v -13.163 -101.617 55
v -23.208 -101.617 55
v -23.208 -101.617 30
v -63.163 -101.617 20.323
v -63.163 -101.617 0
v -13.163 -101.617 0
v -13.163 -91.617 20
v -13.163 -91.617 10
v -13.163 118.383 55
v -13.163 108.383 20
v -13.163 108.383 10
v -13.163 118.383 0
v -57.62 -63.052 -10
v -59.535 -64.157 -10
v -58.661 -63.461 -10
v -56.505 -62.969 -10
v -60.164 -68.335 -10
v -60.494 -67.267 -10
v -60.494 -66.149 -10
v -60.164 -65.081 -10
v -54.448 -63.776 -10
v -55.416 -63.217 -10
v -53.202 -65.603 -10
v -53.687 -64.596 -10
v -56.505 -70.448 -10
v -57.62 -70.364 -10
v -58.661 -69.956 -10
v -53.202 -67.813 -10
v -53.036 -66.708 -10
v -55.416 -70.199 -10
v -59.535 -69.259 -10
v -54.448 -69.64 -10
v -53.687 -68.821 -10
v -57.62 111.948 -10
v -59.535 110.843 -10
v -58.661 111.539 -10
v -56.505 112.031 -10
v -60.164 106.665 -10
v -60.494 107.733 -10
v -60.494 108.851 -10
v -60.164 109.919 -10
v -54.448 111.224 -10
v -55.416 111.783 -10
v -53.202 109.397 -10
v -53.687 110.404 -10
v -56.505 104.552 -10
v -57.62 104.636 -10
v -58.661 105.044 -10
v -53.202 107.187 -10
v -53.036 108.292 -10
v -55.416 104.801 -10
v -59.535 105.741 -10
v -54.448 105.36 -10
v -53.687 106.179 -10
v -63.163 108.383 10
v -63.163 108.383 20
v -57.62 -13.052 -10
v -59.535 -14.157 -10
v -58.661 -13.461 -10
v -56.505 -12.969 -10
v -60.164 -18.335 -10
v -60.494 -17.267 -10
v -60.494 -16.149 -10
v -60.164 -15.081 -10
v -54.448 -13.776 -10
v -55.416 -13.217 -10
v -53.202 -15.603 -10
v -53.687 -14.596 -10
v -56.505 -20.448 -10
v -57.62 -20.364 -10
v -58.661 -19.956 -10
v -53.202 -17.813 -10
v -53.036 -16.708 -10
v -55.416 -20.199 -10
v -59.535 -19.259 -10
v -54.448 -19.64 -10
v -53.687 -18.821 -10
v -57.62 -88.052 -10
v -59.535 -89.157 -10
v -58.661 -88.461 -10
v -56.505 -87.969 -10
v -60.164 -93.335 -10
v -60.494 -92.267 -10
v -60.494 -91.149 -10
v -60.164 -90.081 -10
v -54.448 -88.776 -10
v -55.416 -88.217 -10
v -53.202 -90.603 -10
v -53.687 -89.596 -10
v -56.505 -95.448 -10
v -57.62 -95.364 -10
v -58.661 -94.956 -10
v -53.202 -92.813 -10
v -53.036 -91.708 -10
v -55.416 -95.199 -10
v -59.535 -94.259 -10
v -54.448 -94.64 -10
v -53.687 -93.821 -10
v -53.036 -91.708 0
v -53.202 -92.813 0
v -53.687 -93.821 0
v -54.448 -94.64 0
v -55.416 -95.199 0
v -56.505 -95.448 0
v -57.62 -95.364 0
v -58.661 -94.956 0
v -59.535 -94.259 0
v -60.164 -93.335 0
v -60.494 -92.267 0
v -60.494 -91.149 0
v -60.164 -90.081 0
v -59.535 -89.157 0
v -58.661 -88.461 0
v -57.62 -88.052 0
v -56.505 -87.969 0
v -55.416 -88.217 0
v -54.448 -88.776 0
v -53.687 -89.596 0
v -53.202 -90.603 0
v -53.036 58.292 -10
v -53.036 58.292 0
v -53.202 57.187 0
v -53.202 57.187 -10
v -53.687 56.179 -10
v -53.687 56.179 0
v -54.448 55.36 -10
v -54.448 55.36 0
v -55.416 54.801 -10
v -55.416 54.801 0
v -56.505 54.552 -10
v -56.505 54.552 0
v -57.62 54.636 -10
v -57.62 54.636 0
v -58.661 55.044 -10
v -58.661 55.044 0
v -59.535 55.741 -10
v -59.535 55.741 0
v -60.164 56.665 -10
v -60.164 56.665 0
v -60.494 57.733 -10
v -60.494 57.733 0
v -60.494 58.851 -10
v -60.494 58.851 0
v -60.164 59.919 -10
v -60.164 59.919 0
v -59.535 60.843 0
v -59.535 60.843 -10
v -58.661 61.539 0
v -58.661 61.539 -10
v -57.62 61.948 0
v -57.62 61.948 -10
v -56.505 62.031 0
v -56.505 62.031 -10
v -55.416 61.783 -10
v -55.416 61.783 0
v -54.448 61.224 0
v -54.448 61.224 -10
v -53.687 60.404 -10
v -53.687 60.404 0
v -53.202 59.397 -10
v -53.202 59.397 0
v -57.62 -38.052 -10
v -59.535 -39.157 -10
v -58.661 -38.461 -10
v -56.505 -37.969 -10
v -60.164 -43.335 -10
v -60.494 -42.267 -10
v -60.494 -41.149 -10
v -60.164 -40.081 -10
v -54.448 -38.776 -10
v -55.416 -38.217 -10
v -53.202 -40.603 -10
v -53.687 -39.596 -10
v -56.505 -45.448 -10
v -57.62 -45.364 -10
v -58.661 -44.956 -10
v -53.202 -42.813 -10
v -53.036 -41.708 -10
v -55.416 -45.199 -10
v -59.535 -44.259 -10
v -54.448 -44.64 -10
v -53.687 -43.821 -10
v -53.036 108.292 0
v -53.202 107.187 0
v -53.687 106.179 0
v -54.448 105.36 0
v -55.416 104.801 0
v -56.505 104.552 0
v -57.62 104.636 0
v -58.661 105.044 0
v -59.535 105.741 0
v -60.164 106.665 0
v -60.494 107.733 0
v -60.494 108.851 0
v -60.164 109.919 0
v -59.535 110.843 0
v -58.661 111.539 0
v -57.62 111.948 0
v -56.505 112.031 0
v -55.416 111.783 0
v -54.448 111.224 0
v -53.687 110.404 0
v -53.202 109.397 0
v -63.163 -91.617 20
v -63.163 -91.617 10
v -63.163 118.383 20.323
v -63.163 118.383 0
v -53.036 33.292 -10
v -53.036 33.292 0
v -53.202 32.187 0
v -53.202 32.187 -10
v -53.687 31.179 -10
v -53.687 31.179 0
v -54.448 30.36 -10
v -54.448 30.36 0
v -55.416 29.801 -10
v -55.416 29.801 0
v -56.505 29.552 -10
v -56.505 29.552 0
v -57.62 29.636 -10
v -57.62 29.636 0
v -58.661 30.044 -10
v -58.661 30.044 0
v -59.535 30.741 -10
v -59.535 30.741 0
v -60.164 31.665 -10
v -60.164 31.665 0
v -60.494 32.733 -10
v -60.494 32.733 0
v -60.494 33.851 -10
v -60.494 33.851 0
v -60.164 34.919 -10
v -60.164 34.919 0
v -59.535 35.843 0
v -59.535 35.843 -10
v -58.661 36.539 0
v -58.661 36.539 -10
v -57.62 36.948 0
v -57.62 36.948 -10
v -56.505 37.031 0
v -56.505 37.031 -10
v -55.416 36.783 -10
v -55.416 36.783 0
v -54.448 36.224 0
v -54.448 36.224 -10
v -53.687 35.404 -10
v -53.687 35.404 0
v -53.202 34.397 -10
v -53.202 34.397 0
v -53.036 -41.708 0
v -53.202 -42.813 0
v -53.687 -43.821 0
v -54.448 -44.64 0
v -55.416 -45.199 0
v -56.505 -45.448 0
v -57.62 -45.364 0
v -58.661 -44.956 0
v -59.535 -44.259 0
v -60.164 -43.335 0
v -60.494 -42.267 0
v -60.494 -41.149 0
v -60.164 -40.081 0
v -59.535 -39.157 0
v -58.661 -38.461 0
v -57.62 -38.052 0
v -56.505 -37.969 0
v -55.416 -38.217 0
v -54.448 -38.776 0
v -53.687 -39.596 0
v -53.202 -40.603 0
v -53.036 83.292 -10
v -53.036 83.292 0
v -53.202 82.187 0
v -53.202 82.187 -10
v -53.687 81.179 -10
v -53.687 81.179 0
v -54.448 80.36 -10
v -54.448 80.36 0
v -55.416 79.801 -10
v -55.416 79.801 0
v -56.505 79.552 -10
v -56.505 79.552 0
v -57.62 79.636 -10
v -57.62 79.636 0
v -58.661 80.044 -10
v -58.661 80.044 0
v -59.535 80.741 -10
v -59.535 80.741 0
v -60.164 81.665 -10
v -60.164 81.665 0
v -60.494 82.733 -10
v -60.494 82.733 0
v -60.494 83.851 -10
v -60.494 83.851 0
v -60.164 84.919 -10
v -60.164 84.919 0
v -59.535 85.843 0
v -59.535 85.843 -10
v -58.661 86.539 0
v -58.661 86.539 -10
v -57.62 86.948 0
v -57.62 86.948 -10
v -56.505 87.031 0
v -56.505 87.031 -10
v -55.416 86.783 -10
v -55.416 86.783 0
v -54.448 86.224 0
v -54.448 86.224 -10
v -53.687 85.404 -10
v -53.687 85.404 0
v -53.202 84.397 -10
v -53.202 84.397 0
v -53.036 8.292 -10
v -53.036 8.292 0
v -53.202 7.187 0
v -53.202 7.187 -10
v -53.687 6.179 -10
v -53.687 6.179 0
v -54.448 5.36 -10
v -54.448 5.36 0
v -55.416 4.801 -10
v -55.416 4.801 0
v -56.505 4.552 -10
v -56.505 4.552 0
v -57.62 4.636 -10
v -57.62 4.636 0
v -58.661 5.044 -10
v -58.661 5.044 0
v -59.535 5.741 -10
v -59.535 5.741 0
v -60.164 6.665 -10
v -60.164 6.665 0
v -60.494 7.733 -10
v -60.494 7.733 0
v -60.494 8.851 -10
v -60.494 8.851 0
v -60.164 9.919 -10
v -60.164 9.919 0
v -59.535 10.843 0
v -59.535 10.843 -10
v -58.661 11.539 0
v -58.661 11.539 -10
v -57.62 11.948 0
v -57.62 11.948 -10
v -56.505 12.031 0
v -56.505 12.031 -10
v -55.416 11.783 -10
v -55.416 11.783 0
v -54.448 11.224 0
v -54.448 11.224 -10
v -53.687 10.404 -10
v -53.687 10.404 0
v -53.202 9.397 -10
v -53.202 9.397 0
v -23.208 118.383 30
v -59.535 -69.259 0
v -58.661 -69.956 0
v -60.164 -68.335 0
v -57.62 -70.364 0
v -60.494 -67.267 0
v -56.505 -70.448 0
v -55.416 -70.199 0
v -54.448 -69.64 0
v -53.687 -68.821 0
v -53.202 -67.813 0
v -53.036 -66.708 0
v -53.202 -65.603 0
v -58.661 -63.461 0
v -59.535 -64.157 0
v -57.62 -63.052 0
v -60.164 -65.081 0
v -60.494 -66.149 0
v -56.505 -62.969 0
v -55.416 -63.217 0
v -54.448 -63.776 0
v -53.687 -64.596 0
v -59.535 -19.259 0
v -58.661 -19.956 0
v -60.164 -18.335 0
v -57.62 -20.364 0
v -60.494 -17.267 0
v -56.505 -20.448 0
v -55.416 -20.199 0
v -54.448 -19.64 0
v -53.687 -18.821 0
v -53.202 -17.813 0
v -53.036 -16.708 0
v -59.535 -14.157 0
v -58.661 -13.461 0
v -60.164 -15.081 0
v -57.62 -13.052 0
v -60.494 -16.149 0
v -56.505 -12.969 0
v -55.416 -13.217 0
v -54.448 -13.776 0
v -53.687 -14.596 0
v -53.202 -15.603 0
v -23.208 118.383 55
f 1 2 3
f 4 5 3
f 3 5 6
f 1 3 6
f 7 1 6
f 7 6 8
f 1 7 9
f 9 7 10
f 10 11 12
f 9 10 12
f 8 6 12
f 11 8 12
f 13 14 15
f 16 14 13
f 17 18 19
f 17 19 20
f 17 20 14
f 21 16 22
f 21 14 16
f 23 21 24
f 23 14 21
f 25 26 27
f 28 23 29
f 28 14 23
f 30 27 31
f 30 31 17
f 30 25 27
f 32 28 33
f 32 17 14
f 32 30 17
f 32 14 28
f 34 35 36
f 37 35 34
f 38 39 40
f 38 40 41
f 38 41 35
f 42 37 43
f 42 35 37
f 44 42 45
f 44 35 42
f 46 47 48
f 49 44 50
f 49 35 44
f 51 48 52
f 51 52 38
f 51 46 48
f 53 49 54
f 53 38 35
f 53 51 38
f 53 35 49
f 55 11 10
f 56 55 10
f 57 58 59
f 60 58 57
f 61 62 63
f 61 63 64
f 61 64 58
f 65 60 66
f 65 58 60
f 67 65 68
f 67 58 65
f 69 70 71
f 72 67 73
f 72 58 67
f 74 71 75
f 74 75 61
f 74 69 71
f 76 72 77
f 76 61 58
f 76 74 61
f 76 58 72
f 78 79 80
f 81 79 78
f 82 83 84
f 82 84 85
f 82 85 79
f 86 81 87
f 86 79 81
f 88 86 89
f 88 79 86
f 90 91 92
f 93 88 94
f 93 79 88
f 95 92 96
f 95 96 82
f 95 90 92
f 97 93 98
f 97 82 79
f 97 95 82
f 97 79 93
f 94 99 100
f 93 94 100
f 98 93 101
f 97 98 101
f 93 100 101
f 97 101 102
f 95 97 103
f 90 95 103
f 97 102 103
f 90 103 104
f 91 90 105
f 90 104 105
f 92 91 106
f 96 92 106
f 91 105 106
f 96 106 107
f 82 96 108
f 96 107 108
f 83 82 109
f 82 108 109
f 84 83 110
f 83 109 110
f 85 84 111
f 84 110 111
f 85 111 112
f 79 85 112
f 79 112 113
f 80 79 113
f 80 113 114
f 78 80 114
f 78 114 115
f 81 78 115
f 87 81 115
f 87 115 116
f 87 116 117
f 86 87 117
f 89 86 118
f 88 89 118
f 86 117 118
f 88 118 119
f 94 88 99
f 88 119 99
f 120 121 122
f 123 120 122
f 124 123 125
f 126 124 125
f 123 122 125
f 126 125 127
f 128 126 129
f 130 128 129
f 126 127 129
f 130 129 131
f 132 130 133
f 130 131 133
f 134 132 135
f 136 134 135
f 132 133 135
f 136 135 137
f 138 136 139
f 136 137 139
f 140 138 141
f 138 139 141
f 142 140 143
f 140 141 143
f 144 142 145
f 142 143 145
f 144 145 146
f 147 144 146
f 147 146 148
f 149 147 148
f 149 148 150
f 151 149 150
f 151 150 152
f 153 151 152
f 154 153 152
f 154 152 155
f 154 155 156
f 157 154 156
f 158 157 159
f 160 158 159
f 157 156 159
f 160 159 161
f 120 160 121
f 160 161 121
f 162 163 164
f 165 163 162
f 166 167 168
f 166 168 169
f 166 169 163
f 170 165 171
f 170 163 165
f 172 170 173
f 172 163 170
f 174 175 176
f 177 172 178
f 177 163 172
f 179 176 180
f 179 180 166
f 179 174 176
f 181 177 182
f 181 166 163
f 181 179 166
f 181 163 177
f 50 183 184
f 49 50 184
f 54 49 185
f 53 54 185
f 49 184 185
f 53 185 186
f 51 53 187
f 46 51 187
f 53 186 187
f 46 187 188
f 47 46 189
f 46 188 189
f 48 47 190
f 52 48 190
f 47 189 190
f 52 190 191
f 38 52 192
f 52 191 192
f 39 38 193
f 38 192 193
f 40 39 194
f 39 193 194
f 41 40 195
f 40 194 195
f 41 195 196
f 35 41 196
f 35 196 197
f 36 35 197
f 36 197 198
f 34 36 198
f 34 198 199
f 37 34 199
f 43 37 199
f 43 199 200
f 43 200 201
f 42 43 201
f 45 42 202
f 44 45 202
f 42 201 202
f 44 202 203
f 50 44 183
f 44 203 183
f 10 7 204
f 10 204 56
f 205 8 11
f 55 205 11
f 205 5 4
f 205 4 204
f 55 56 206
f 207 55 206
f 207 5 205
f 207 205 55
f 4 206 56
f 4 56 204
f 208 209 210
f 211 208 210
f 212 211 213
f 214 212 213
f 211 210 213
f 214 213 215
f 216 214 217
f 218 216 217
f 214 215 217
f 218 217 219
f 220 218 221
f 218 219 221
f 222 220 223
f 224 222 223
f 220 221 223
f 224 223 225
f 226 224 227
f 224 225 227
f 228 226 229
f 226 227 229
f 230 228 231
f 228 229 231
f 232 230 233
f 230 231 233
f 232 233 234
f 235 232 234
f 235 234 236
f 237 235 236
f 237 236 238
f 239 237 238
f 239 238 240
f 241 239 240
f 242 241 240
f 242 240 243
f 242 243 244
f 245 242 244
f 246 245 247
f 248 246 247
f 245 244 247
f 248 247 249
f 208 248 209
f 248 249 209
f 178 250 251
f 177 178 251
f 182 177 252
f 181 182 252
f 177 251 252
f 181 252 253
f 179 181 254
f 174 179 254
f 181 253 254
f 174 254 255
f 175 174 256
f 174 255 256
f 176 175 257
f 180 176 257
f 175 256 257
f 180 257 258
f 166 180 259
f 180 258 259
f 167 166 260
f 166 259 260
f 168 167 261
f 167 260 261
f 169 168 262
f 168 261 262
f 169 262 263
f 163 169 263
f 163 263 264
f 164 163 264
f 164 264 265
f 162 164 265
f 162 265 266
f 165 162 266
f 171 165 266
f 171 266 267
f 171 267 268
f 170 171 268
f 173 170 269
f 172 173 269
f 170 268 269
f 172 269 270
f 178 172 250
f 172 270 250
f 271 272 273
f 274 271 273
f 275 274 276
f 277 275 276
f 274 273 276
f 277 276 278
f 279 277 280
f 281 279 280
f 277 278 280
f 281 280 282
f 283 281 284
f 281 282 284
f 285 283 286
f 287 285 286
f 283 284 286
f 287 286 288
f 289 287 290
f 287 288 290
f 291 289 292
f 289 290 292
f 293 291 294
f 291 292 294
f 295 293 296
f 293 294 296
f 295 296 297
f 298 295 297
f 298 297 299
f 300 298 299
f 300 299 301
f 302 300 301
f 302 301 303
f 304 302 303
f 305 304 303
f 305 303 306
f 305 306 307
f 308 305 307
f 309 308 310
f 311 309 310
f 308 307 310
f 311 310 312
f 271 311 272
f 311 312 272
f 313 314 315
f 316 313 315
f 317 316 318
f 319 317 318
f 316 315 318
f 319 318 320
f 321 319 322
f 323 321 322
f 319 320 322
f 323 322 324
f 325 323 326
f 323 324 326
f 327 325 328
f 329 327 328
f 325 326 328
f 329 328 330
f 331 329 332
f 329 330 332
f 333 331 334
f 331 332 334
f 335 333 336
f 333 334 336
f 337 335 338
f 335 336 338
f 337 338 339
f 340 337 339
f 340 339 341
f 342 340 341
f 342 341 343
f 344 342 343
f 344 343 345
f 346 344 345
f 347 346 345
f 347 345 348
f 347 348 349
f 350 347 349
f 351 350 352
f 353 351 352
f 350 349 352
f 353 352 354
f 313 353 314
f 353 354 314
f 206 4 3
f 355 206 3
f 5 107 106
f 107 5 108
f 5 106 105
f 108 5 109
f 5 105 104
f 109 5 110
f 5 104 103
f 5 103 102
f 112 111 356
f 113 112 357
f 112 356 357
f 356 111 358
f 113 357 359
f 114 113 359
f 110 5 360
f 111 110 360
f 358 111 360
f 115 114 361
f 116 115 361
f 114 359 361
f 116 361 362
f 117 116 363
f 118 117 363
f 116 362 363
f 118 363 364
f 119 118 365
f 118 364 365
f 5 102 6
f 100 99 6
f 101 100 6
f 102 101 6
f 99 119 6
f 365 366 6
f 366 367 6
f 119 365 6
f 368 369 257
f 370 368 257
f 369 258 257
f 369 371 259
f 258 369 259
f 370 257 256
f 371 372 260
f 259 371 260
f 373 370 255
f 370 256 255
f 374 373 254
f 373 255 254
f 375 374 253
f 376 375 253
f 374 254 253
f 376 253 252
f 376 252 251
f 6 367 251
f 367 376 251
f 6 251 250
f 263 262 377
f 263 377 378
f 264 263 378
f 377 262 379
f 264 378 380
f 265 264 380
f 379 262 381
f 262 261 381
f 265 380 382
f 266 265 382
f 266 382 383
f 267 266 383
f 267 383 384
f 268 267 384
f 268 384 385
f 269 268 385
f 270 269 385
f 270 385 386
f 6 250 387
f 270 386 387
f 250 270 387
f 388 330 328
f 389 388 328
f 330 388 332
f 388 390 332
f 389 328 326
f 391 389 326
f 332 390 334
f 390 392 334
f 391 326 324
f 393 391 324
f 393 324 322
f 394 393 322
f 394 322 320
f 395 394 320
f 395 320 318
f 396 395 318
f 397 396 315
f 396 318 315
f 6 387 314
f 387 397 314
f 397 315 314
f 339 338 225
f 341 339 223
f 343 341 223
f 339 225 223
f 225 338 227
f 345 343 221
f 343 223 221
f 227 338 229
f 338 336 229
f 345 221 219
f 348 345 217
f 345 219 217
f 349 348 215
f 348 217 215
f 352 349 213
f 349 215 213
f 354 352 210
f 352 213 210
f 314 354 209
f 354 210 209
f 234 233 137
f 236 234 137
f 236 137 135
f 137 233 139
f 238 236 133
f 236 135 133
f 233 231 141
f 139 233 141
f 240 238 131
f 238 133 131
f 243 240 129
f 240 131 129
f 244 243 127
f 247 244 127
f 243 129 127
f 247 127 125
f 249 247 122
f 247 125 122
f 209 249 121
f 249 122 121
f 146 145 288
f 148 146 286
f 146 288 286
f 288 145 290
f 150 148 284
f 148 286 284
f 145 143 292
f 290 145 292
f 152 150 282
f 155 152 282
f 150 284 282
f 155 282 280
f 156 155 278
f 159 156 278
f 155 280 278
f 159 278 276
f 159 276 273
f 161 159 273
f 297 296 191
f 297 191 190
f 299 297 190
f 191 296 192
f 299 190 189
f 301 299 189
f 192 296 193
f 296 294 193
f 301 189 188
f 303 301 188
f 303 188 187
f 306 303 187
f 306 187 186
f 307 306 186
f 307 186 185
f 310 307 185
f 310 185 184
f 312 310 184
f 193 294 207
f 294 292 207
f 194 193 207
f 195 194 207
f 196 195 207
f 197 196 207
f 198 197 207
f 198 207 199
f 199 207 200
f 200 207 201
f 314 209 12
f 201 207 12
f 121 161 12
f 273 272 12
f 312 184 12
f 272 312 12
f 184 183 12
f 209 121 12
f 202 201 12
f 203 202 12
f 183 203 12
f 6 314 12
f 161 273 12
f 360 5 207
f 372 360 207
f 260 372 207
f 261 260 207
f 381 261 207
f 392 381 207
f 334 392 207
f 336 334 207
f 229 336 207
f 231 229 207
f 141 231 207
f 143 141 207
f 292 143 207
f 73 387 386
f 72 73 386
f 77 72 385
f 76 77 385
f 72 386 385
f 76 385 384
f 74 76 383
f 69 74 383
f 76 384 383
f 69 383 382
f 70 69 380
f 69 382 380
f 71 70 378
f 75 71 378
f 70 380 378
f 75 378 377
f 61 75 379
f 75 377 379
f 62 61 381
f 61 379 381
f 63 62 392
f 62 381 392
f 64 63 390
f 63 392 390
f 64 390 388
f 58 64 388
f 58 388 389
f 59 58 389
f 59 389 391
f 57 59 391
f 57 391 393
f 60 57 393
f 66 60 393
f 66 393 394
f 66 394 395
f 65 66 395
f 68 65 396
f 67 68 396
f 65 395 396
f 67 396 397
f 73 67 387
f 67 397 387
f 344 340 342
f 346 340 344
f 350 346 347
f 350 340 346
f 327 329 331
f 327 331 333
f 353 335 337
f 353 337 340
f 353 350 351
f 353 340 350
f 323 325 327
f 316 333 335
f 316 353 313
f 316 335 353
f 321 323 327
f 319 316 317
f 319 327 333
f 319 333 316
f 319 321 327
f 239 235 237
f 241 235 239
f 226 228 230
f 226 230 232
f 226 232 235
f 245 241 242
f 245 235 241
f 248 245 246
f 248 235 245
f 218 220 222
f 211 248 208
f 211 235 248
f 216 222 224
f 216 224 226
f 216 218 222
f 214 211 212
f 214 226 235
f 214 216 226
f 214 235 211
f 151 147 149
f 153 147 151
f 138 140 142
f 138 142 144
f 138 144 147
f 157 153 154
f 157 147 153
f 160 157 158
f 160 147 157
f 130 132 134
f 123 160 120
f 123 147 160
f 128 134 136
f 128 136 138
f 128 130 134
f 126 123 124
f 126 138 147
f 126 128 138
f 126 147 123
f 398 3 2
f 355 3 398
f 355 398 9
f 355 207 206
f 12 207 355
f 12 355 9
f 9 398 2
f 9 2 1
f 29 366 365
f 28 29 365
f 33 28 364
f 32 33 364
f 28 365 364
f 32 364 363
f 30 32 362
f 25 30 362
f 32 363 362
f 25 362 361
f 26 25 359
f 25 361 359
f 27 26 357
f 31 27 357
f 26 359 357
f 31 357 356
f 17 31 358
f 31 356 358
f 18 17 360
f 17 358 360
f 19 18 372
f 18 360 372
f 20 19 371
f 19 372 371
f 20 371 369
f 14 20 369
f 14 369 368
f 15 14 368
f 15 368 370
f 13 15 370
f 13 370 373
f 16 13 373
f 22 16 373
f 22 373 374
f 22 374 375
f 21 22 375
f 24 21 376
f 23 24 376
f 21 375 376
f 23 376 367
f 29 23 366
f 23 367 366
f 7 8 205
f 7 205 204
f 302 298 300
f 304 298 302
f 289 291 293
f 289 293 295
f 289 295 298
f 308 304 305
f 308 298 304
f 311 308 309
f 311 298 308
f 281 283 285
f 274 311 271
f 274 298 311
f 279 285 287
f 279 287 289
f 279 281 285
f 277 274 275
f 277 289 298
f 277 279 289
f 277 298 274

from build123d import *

# Parameters (mm, degrees)
F0_W     = 50
F0_H     = 220
F1_DEPTH = 30
F2_W     = 200.0000000022
F2_H     = 10
F3_DEPTH = 50
F5_DEPTH = 220
F6_DEPTH = 25
F7_R     = 3.75
F8_DEPTH = 10


with BuildPart() as f1:
    # F0 (on Top) → F1 (new body)
    with BuildSketch(Plane.XY):
        with Locations((-38.1634101286, 8.3829769865)):
            Rectangle(F0_W, F0_H)
    extrude(amount=F1_DEPTH)

    # F2 (on face) → F3 (cut, through all)
    with BuildSketch(Plane.YZ.offset(-13.1634101286)):
        with Locations((8.3829769876, 15)):
            Rectangle(F2_W, F2_H)
    extrude(amount=-F3_DEPTH, mode=Mode.SUBTRACT)

    # F4 (on face) → F5 (cut, through all)
    with BuildSketch(Plane.XZ.offset(101.6170230135)):
        Polygon((-63.1634101286, 30), (-63.1634101286, 20.3228145838), (-23.2081543654, 30), align=None)
    extrude(amount=-F5_DEPTH, mode=Mode.SUBTRACT)

    # F6 (add): a face of the model
    f6_faces = [f1.faces().sort_by_distance(p)[0] for p in [
        (-18.185782247, 8.3829769865, 30),
    ]]
    extrude(f6_faces, amount=F6_DEPTH)

    # F7 (on face) → F8 (join)
    with BuildSketch(Plane(origin=(0, 0, 0), x_dir=(1, 0, 0), z_dir=(0, 0, -1))):
        with Locations((-56.7856021225, -108.2918941975)):
            Circle(F7_R)
        with Locations((-56.7856021225, -83.2918941975)):
            Circle(F7_R)
        with Locations((-56.7856021225, -58.2918941975)):
            Circle(F7_R)
        with Locations((-56.7856021225, -33.2918941975)):
            Circle(F7_R)
        with Locations((-56.7856021225, -8.2918941975)):
            Circle(F7_R)
        with Locations((-56.7856021225, 16.7081058025)):
            Circle(F7_R)
        with Locations((-56.7856021225, 41.7081058025)):
            Circle(F7_R)
        with Locations((-56.7856021225, 66.7081058025)):
            Circle(F7_R)
        with Locations((-56.7856021225, 91.7081058025)):
            Circle(F7_R)
    extrude(amount=F8_DEPTH)


solid = f1.part
